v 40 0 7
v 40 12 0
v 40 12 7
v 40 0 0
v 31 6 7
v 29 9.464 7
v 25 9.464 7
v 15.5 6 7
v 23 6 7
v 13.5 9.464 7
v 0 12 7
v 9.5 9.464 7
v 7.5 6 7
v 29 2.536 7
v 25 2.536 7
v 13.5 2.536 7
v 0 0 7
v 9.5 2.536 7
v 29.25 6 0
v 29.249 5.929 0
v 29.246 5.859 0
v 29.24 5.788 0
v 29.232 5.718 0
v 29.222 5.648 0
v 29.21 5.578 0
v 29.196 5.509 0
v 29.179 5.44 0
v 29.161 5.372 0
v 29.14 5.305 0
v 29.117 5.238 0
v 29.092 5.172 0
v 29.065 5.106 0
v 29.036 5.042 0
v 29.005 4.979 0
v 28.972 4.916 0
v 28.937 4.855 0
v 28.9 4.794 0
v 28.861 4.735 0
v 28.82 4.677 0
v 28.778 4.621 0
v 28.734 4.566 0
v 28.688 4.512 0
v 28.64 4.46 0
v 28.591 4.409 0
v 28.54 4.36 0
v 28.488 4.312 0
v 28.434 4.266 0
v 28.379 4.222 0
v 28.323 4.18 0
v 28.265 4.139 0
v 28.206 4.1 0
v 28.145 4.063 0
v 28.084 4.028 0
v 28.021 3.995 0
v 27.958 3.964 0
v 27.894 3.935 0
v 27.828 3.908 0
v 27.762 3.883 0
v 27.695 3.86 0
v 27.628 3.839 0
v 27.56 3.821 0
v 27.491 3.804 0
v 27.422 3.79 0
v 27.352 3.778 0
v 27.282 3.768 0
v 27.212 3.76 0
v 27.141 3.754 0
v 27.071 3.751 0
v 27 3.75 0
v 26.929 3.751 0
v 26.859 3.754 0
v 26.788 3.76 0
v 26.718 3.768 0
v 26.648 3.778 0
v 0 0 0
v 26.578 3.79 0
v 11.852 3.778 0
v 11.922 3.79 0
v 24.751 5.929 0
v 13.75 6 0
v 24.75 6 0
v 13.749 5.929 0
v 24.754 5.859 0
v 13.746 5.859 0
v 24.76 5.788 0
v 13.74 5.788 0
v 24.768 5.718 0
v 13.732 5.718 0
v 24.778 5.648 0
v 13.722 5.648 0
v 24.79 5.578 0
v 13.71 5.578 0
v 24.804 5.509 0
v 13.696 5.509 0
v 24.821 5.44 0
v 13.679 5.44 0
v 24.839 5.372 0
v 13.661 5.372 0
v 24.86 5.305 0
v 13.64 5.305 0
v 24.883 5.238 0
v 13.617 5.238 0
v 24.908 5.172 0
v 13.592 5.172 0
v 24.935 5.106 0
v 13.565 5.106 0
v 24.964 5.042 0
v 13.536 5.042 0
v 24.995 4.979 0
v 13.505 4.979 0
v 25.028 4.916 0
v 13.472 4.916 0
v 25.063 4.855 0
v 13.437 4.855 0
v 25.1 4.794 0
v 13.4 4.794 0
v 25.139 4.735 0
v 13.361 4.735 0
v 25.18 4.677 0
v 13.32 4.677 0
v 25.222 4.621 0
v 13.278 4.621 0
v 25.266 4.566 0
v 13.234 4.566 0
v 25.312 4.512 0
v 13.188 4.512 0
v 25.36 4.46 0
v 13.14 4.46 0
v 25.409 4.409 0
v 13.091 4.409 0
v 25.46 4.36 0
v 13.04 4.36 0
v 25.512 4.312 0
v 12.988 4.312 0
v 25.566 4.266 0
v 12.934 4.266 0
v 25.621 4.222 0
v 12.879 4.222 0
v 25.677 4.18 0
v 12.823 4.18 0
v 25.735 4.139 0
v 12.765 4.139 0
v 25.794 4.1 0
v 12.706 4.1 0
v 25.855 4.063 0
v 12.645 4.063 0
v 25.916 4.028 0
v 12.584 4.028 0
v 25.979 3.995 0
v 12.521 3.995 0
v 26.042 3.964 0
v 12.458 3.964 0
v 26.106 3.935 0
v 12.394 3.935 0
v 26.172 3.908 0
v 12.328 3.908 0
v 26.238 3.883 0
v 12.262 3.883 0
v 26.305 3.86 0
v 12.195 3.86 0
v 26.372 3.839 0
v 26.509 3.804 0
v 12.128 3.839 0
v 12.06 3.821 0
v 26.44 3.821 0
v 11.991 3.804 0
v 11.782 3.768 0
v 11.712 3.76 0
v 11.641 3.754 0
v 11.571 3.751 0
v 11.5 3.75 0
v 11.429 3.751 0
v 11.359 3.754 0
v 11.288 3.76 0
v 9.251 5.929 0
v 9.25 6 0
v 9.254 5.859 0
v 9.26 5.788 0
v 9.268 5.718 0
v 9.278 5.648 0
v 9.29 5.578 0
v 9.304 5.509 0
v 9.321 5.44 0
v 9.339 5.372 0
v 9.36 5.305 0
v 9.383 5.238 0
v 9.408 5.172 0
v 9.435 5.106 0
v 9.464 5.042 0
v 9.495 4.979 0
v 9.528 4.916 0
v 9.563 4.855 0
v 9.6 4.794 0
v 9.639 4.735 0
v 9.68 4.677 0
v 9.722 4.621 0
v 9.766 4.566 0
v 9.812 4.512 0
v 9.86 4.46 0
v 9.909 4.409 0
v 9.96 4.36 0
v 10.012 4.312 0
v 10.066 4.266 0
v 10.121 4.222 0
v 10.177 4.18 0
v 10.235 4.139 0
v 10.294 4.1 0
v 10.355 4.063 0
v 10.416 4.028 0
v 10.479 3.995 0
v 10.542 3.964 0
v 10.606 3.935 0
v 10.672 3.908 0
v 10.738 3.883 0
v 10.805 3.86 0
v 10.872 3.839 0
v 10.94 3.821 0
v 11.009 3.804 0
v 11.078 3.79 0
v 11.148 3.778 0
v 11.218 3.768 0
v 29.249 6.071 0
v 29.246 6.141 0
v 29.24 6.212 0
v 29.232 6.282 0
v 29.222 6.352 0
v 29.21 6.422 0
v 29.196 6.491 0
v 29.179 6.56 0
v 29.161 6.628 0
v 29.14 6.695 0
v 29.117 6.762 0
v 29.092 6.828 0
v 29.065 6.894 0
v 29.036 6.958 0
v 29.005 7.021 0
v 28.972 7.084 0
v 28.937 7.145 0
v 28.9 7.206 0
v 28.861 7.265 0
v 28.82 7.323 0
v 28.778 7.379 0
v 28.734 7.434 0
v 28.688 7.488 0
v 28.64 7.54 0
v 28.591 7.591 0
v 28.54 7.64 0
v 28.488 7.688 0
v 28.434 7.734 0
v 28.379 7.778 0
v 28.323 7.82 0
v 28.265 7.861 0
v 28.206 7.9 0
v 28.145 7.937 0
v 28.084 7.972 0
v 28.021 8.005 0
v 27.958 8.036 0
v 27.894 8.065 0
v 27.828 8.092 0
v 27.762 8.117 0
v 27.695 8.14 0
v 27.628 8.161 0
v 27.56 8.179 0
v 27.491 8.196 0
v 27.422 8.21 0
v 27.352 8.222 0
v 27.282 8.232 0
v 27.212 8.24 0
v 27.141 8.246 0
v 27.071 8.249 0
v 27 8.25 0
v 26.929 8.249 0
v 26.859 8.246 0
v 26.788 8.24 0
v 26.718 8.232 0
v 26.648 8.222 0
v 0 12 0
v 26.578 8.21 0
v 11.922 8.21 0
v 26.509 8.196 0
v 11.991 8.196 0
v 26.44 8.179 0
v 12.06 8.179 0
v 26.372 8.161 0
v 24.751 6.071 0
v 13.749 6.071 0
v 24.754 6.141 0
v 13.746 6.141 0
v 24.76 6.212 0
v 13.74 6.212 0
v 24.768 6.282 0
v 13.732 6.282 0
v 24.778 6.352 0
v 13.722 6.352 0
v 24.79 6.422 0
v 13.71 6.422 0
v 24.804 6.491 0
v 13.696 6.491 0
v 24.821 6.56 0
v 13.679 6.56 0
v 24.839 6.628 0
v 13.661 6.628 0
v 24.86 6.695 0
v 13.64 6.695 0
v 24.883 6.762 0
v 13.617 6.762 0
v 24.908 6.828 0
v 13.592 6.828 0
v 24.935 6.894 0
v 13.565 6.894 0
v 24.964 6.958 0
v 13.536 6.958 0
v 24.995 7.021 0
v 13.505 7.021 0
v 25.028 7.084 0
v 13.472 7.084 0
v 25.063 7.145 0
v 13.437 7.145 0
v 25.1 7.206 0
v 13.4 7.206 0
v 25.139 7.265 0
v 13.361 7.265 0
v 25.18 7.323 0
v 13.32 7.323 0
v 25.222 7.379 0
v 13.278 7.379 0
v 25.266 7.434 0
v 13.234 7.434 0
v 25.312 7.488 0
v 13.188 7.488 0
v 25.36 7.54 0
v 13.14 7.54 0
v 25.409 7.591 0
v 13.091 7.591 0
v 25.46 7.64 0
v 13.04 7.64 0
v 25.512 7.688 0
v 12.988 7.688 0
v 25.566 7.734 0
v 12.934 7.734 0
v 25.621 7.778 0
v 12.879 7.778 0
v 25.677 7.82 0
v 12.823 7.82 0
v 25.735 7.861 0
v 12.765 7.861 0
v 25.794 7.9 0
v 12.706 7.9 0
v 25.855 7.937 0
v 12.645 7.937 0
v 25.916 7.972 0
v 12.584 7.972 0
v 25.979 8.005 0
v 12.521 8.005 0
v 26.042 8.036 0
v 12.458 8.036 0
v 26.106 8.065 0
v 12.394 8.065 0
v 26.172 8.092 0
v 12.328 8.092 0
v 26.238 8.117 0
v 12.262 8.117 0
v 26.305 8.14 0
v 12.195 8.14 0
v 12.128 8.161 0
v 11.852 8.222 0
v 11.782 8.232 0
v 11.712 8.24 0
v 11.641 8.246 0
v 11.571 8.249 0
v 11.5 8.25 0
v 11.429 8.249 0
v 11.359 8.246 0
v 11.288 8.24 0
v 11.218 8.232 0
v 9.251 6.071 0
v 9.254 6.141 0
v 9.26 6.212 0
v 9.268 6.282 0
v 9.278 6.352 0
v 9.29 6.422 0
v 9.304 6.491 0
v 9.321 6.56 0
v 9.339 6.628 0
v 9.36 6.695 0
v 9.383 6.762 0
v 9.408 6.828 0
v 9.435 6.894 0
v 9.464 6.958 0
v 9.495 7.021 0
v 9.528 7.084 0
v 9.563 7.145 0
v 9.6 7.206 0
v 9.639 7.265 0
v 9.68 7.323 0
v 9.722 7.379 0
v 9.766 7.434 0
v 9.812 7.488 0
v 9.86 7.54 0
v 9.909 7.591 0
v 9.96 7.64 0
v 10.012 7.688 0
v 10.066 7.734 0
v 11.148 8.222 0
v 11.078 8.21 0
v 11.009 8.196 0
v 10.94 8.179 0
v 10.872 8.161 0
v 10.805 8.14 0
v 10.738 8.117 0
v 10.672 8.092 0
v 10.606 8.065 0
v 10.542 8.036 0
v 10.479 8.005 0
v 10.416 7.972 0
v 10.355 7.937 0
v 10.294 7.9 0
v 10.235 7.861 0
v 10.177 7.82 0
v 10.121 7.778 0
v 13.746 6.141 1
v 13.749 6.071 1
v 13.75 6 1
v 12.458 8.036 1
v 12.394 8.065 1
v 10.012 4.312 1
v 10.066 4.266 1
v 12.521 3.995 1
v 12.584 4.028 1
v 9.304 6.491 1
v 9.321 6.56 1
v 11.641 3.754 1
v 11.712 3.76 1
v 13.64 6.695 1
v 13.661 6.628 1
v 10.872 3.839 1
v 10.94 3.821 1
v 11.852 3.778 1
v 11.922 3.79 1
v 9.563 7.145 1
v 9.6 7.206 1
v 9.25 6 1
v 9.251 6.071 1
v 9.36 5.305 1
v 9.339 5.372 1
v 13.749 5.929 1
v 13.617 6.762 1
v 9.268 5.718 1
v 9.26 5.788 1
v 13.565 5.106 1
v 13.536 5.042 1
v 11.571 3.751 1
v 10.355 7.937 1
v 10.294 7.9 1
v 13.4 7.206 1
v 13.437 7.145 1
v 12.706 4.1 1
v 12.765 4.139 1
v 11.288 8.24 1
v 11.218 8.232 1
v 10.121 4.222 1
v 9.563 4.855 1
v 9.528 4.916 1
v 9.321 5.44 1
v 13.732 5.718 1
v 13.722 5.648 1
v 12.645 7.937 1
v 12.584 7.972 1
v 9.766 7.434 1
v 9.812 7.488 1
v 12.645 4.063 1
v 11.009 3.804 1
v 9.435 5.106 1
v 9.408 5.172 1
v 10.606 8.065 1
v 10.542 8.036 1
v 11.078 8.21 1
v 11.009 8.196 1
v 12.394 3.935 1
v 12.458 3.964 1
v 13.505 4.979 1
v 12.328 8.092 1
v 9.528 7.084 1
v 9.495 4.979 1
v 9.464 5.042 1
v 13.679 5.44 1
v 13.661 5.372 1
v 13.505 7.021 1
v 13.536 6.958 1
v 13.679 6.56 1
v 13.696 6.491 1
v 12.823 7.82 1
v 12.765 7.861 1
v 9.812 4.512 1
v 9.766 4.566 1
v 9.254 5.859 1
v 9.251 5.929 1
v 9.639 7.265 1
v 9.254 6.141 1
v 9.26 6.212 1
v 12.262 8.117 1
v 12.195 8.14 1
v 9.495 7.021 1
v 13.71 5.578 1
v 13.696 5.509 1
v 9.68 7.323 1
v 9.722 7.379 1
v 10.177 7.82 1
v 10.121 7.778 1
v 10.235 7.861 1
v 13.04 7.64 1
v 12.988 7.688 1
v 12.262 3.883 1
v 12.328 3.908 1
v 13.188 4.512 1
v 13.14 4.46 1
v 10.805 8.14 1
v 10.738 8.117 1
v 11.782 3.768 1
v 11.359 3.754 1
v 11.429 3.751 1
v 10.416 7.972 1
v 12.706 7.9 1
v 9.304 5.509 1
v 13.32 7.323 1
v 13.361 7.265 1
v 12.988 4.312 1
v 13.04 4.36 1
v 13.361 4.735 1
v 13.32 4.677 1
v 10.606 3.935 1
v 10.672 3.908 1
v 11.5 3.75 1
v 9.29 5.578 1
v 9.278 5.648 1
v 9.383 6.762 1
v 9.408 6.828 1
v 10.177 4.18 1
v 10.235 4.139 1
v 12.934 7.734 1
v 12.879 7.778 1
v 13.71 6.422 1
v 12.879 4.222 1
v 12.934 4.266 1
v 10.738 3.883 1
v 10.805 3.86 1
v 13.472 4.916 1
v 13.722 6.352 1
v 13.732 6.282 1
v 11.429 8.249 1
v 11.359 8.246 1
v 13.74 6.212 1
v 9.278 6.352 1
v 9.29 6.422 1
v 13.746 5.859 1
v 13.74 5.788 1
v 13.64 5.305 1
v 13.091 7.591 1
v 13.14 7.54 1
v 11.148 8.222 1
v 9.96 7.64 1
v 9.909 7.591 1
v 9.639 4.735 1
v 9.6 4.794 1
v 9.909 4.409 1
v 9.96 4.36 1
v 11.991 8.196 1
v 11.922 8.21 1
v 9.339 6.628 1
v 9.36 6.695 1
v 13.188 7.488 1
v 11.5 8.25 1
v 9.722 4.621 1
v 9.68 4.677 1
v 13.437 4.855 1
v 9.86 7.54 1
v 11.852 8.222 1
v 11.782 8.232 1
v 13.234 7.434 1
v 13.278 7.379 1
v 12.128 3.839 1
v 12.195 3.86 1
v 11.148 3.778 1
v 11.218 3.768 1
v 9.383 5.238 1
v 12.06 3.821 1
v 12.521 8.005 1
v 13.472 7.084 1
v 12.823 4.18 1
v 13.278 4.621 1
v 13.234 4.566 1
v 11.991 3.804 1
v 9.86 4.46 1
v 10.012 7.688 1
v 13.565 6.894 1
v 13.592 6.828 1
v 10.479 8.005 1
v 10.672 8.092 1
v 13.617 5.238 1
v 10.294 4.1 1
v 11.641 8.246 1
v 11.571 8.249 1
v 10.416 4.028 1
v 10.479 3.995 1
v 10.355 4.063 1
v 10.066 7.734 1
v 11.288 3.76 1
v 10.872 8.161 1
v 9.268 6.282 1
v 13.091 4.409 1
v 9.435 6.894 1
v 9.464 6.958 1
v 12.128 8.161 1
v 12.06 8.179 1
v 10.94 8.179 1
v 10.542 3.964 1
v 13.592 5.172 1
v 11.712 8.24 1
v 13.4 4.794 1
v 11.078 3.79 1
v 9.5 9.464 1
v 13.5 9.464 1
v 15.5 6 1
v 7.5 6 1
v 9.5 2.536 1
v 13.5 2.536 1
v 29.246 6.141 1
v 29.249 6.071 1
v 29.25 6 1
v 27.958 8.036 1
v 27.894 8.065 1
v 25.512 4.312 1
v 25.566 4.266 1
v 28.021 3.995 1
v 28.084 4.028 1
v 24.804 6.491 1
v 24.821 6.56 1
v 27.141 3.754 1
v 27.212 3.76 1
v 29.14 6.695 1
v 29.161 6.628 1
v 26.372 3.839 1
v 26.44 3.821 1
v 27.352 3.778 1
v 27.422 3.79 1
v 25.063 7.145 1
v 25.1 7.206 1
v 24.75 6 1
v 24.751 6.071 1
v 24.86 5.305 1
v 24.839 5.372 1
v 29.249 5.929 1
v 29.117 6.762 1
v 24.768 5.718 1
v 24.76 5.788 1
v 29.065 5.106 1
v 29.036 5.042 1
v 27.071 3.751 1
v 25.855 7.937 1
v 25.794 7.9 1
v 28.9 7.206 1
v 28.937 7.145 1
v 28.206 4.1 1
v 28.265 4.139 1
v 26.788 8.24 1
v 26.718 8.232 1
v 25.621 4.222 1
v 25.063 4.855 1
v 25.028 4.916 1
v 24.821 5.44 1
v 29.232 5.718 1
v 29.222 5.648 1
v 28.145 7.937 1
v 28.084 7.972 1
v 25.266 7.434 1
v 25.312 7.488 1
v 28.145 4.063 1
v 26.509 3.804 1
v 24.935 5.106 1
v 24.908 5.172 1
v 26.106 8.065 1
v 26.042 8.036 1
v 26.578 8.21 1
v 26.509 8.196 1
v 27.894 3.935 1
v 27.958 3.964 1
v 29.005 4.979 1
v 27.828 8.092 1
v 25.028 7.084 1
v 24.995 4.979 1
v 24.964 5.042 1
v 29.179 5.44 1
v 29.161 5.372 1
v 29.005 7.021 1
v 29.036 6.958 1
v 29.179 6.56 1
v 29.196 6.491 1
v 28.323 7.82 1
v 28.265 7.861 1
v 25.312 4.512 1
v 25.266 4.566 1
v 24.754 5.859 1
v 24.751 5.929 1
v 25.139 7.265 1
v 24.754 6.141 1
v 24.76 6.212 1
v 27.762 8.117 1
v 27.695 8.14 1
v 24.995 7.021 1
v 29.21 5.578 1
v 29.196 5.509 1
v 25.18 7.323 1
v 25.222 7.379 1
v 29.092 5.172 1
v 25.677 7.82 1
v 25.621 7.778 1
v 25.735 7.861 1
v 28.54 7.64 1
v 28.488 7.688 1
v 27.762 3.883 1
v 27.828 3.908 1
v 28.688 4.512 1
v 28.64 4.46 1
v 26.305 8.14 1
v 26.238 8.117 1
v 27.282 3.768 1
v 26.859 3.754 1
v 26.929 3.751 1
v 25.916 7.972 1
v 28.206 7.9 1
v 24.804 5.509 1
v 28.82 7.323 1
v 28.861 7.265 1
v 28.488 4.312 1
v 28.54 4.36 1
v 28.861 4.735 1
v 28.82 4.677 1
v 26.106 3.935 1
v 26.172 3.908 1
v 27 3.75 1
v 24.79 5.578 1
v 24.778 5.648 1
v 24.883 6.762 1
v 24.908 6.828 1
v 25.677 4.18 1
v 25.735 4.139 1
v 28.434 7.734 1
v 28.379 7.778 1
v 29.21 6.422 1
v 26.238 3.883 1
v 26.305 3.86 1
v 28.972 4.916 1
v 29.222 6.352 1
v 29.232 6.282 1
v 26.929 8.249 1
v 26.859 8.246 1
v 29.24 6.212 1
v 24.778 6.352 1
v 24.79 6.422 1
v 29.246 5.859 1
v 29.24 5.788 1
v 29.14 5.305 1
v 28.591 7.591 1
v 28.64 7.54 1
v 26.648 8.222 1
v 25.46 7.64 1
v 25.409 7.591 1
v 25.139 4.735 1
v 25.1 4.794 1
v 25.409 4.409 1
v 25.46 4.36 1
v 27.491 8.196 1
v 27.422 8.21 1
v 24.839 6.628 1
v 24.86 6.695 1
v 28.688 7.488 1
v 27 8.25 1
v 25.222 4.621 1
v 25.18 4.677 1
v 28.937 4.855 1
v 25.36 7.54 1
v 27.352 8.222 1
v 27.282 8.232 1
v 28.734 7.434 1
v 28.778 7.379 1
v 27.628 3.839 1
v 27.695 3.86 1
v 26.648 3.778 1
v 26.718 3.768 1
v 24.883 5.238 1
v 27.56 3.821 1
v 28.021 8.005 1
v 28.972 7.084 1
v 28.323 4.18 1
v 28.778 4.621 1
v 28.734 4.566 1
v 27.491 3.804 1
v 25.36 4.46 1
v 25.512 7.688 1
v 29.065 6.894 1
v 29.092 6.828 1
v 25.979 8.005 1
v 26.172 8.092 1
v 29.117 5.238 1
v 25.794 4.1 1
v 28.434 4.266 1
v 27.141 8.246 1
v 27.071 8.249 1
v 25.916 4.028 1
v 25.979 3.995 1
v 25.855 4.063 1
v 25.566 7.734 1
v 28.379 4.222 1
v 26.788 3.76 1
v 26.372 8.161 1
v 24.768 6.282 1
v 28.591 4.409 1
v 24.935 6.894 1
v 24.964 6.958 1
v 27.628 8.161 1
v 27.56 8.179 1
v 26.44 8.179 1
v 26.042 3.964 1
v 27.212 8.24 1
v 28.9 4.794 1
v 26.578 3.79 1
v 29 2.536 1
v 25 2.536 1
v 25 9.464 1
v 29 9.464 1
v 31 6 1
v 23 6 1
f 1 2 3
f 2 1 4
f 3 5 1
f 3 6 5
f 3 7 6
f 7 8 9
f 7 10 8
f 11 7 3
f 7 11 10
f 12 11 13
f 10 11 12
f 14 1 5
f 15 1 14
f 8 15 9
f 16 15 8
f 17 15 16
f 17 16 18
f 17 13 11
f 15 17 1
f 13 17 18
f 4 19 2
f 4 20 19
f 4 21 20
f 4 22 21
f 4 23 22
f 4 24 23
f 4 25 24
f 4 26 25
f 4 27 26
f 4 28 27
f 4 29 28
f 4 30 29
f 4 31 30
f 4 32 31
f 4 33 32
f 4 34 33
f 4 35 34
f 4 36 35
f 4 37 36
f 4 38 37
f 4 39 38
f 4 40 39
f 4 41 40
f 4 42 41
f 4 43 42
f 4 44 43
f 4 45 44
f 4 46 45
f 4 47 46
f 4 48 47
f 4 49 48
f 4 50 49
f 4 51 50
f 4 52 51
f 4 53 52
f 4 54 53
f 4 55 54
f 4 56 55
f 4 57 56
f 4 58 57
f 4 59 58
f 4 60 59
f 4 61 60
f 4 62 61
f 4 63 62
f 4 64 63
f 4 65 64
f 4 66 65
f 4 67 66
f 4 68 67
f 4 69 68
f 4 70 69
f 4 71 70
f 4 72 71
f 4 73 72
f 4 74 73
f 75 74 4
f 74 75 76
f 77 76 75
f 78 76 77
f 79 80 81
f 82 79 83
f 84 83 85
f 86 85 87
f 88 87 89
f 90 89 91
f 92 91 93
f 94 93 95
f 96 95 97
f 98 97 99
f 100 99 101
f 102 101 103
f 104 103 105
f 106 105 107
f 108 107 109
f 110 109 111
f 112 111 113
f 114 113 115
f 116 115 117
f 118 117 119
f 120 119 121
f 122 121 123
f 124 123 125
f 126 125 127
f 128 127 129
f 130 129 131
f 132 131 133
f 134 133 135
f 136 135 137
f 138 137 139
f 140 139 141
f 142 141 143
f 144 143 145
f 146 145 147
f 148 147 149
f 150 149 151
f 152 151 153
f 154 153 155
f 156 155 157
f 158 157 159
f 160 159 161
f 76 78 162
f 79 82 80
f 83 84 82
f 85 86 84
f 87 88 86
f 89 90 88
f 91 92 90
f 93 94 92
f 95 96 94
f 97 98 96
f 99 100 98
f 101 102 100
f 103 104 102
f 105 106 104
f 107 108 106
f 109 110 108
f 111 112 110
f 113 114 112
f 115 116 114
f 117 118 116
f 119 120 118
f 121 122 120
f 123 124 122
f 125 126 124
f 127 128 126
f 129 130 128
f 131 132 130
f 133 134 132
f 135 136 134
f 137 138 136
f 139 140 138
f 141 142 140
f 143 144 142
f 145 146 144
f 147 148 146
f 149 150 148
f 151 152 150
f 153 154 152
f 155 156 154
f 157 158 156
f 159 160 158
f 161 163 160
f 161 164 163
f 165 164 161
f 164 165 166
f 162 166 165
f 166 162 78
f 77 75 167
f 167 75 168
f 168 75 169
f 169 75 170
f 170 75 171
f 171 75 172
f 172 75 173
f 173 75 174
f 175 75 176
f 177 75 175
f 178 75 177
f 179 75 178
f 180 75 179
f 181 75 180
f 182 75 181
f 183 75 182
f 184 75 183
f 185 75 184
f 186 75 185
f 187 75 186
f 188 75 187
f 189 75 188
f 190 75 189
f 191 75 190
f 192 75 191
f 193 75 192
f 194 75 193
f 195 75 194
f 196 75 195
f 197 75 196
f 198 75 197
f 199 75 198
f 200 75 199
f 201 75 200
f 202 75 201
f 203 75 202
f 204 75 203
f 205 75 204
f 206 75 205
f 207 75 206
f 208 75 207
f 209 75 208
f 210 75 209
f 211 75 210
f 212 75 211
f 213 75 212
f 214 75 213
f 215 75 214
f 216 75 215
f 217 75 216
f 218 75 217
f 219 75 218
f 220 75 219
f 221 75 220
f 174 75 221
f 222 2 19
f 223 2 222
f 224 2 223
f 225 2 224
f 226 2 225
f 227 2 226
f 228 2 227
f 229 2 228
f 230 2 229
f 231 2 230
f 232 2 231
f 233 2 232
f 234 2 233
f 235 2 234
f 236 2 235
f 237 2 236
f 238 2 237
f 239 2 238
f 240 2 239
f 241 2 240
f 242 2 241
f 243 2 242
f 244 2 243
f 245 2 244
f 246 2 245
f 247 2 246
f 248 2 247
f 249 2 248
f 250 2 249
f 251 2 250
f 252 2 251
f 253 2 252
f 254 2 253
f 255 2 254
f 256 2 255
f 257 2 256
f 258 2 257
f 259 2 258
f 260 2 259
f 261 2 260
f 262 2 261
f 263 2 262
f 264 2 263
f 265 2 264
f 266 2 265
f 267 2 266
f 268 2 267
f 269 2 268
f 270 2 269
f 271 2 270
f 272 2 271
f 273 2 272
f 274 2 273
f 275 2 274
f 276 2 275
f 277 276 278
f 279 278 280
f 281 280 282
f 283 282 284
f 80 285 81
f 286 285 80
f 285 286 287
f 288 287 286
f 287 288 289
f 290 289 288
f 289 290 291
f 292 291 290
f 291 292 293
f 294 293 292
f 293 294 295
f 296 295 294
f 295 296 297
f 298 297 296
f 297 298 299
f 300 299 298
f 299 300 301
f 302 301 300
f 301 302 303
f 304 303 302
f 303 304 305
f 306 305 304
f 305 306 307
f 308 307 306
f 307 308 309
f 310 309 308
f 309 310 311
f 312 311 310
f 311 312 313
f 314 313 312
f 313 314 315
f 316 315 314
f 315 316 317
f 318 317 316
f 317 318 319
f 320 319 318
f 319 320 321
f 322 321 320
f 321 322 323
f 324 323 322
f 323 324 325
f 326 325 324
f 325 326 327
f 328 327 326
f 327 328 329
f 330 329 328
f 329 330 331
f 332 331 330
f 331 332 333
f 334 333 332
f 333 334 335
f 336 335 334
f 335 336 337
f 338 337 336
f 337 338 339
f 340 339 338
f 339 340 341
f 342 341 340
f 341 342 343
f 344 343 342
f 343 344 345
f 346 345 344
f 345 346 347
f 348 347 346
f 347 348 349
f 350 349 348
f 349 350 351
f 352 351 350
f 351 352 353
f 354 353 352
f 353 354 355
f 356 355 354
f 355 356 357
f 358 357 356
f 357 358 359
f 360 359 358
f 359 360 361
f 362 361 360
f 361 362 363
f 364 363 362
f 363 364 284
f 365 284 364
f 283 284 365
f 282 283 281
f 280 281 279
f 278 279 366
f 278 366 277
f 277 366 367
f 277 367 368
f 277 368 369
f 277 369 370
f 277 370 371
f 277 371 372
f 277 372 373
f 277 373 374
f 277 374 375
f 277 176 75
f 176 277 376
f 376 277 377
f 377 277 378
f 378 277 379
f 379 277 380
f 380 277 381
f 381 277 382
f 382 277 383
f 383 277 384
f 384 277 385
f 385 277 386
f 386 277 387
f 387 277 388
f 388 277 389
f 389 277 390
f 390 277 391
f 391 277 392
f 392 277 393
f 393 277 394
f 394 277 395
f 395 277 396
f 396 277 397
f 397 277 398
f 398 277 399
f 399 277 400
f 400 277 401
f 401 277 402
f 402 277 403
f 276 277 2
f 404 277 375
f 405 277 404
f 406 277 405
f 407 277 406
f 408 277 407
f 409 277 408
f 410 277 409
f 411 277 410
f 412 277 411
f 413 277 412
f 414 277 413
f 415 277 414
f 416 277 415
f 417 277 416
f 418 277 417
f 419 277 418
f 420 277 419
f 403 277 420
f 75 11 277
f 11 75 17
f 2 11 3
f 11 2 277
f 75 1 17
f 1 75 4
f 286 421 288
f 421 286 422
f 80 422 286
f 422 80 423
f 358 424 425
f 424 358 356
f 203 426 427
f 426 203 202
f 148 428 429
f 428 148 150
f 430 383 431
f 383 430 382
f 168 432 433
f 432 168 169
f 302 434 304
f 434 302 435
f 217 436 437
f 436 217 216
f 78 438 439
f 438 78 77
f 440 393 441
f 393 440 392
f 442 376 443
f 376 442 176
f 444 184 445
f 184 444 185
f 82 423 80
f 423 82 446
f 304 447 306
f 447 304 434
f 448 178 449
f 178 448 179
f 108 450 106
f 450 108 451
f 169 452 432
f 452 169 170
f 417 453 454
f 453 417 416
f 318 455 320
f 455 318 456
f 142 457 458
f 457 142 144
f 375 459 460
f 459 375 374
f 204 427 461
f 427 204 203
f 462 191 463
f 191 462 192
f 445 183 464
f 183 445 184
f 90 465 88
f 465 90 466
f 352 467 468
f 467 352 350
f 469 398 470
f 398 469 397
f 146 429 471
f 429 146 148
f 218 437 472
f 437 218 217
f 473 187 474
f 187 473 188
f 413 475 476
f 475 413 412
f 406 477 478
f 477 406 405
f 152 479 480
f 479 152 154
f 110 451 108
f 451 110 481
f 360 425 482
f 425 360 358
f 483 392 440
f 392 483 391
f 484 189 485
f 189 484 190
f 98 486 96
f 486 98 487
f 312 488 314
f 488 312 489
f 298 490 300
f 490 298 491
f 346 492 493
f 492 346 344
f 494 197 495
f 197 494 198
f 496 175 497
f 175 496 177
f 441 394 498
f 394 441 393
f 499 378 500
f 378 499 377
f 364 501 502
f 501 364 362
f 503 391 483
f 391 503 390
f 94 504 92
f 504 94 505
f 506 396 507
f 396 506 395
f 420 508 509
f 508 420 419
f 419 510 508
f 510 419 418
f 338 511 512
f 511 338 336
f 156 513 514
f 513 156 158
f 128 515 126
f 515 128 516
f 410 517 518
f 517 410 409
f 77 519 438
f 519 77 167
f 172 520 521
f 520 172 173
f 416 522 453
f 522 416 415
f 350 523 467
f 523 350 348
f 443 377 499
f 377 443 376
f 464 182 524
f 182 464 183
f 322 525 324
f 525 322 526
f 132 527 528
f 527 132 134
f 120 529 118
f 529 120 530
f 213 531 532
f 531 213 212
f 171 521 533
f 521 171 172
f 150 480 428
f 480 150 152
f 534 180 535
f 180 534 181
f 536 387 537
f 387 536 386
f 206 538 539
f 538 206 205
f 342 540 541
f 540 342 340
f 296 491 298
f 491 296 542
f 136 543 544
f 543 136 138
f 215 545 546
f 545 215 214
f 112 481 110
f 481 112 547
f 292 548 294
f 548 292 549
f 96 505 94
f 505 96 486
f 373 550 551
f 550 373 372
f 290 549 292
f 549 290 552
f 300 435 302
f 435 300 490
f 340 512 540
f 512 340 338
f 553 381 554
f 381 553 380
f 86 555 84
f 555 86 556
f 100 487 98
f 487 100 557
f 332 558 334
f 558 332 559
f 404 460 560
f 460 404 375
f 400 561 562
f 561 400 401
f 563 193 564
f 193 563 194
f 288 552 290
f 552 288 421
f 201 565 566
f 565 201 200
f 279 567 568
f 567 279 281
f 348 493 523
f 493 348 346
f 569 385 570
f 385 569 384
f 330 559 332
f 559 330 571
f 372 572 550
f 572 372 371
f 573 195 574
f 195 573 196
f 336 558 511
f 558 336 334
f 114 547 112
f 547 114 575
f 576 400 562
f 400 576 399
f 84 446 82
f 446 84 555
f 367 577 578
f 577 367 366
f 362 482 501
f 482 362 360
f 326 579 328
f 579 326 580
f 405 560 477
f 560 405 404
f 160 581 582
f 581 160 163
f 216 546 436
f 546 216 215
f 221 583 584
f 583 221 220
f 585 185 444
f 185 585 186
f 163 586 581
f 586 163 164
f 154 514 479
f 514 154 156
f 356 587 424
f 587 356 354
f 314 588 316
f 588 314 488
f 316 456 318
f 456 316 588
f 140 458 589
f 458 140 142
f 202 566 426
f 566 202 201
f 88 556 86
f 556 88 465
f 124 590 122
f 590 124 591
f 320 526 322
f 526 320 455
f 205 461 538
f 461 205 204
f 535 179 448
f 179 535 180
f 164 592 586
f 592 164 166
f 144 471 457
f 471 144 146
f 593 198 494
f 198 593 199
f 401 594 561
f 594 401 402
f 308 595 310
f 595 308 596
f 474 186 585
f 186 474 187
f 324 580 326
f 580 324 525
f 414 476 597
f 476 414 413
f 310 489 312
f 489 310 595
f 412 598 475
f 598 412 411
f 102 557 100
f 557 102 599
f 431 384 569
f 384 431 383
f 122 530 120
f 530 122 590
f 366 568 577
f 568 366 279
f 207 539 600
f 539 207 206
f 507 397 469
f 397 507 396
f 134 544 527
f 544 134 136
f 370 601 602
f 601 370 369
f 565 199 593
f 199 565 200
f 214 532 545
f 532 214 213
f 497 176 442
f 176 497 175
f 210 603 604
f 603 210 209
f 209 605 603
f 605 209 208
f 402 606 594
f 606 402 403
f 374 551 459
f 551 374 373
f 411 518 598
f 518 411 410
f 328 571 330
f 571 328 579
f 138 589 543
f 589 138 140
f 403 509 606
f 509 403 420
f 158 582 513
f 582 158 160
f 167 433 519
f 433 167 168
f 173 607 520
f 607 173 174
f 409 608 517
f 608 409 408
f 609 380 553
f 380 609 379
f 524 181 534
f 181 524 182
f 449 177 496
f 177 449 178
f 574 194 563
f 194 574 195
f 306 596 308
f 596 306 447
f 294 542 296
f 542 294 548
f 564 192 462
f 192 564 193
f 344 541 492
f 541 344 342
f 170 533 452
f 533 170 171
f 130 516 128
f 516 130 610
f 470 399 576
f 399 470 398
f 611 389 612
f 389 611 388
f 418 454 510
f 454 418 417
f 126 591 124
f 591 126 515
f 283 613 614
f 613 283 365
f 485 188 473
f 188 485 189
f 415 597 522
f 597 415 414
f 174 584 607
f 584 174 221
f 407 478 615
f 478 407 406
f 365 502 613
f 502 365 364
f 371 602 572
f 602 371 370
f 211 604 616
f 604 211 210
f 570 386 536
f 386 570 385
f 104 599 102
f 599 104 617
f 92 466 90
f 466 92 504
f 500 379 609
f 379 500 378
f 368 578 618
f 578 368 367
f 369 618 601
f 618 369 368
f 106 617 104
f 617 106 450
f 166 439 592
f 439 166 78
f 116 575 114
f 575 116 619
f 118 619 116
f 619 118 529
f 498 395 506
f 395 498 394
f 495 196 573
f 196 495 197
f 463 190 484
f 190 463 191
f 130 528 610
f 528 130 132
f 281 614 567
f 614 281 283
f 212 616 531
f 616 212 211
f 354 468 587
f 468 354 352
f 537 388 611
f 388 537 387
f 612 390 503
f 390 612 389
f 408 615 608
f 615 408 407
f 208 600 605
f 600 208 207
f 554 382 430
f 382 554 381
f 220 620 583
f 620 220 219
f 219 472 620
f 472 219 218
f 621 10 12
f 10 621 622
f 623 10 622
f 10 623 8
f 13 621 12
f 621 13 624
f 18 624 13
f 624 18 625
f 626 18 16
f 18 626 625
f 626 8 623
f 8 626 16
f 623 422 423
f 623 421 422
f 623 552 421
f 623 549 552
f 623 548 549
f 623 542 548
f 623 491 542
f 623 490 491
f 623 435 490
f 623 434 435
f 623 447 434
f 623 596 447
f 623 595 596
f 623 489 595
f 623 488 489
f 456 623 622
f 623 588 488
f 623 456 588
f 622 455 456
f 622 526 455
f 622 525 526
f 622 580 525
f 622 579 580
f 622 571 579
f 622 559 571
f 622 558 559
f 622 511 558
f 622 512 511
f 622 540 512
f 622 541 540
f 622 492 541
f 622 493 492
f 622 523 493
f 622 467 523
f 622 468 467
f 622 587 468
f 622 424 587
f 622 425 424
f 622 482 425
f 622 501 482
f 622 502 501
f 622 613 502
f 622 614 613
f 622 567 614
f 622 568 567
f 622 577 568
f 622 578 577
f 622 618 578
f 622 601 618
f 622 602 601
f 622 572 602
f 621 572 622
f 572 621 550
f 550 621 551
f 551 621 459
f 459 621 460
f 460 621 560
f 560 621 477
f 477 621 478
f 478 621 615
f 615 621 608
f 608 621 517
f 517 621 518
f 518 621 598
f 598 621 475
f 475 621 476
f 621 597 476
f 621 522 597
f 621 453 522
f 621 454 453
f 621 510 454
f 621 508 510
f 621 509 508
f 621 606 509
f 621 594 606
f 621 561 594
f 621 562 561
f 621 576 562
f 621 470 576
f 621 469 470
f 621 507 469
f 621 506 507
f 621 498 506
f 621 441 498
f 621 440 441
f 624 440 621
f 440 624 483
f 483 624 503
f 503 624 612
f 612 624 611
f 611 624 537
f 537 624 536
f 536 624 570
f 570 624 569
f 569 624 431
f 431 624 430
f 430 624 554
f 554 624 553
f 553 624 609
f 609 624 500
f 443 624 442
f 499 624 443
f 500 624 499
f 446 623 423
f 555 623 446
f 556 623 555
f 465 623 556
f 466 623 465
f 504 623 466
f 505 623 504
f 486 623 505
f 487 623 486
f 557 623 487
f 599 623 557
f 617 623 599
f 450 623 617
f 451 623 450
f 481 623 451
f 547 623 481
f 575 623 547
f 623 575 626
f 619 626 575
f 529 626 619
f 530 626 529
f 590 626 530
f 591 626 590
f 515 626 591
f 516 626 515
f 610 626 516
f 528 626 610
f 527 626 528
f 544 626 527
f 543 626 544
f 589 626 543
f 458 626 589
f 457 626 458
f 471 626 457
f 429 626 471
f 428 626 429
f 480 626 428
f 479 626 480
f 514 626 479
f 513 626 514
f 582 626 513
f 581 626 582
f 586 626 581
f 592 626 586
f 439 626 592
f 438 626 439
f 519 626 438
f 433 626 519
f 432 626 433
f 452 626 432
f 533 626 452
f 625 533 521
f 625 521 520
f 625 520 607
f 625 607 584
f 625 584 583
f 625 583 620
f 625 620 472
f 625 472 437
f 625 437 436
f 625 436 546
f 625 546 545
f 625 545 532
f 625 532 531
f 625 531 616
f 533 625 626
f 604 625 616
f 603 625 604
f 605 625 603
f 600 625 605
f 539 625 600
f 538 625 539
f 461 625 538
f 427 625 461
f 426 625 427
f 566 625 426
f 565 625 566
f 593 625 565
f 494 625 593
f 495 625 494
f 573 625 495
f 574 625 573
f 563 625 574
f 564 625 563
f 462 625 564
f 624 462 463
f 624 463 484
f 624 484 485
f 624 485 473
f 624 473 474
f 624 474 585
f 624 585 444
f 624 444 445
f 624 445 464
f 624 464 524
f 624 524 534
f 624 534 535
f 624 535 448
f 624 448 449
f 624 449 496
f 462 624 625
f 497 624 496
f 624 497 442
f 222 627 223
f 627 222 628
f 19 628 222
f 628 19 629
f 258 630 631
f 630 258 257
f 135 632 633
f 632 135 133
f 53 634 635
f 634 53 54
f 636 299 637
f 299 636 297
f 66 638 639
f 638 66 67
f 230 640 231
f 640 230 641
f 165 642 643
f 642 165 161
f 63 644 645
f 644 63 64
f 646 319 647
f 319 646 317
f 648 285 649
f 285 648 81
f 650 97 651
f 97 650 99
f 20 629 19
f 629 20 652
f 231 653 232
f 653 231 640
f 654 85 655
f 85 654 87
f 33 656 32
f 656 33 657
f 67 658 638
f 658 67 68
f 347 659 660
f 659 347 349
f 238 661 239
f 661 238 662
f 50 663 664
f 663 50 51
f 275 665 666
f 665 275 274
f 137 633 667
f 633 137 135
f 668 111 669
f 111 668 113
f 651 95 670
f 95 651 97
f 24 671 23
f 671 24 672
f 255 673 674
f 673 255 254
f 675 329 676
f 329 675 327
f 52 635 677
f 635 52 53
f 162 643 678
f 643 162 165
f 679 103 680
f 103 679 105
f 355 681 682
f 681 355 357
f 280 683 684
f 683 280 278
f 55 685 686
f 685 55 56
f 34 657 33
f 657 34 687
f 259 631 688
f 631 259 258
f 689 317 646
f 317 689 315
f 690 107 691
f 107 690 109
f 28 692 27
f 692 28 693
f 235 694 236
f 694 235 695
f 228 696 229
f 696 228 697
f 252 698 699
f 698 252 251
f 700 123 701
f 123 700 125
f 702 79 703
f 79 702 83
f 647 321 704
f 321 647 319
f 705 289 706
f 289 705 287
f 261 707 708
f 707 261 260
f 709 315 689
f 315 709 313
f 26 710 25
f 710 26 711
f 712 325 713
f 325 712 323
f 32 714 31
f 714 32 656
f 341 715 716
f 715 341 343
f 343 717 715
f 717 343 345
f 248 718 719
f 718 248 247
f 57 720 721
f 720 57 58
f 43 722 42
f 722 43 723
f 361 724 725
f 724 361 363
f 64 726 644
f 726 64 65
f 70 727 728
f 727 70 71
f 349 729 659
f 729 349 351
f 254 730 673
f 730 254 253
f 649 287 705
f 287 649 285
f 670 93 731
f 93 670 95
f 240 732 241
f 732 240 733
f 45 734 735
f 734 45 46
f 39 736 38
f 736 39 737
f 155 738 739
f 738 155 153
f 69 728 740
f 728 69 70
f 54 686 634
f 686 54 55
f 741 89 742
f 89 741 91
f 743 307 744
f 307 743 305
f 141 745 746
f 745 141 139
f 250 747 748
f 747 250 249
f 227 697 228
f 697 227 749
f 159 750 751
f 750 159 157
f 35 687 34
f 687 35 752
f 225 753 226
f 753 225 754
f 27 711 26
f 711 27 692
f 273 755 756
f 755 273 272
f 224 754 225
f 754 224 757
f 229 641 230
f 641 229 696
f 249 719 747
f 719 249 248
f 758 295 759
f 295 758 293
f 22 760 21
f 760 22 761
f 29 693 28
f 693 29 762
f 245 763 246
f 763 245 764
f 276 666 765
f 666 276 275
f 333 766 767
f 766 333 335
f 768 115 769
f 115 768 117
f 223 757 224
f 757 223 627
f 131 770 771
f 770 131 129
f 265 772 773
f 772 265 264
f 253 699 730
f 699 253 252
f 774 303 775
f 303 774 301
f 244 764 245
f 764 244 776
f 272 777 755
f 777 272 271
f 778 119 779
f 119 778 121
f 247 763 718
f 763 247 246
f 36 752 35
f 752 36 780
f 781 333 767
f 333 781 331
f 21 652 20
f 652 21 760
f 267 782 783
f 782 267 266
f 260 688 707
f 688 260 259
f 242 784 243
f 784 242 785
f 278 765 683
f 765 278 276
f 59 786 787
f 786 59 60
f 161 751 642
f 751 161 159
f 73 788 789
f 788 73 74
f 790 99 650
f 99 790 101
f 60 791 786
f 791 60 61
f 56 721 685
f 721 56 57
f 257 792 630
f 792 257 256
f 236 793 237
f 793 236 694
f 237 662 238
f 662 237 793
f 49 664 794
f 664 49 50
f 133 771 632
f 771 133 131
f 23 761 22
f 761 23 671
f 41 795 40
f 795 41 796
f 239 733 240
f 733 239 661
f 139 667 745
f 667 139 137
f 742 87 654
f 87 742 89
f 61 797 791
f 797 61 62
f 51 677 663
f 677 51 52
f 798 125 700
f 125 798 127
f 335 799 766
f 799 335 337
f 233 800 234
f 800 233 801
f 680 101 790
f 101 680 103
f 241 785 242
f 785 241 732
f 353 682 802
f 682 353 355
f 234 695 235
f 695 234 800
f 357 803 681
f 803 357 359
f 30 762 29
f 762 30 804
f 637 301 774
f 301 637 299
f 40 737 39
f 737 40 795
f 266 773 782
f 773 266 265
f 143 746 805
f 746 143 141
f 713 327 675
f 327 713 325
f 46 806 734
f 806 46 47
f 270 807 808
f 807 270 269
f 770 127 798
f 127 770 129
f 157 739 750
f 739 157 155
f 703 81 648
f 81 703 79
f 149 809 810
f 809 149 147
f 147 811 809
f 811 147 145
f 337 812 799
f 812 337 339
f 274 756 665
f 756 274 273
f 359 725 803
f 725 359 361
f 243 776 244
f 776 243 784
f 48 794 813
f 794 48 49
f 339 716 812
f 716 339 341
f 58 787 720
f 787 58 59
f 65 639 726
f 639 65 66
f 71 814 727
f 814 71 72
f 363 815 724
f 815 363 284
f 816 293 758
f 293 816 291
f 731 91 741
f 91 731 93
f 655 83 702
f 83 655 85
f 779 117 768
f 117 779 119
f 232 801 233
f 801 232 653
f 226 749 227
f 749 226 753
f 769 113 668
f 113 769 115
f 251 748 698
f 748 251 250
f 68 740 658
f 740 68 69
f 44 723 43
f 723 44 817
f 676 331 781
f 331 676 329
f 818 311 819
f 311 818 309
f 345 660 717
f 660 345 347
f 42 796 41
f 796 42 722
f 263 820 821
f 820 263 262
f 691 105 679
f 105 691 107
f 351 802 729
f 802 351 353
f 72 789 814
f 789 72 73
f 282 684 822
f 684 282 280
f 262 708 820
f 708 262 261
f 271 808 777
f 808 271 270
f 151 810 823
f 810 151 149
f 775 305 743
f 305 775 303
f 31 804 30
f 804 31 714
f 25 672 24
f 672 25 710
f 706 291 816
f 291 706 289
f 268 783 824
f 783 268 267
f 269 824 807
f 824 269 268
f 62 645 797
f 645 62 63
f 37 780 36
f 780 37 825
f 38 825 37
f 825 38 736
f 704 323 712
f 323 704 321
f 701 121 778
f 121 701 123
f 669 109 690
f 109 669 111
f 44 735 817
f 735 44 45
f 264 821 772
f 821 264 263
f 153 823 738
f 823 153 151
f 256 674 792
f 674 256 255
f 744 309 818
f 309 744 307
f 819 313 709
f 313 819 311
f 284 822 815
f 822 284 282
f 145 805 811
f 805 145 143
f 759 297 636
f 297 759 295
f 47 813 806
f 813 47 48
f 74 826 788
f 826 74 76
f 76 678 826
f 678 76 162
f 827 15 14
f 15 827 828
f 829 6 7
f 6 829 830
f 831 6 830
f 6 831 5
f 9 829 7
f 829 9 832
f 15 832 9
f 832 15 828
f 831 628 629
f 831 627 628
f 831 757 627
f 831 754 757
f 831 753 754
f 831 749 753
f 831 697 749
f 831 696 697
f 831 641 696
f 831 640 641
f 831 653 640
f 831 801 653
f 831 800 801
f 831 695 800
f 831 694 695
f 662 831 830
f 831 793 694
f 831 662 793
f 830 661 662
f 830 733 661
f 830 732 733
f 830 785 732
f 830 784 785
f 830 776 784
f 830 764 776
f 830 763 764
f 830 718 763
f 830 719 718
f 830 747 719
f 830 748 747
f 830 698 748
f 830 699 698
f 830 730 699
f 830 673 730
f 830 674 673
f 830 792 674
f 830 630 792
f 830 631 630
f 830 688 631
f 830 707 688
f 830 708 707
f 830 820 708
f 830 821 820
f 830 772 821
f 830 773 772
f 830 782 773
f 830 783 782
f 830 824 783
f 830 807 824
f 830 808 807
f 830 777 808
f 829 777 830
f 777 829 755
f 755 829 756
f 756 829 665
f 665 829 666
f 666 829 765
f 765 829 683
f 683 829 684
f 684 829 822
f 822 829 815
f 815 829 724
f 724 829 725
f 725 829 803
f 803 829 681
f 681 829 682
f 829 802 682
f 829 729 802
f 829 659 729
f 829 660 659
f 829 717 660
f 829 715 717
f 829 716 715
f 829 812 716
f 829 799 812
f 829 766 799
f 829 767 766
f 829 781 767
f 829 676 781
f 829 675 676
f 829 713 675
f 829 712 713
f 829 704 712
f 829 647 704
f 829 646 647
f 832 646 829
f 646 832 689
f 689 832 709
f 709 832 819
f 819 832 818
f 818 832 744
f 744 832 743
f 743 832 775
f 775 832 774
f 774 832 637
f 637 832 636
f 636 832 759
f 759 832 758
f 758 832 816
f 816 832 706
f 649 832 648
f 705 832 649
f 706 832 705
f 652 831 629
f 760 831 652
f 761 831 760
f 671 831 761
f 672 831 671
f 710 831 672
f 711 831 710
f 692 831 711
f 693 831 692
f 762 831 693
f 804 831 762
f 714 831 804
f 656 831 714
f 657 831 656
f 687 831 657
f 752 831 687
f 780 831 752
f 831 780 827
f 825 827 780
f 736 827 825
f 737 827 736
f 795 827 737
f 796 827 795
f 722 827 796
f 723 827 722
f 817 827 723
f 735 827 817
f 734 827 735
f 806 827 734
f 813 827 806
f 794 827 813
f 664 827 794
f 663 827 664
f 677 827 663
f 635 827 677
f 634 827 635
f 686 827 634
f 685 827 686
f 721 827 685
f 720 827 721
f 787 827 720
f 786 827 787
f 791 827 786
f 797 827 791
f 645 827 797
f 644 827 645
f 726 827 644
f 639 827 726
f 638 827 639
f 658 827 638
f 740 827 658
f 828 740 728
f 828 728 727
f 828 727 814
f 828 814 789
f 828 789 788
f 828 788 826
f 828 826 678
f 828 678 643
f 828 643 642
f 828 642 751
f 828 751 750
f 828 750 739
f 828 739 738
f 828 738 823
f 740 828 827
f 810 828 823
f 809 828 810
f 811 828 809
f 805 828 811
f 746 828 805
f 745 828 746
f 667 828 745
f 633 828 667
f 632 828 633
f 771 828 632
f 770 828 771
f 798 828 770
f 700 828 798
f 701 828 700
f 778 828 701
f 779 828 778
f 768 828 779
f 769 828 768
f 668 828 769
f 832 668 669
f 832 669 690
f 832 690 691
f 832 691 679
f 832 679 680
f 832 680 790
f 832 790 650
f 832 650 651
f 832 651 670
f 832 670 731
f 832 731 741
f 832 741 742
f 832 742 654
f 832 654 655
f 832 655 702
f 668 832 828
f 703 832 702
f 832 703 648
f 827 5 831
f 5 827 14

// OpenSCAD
$fn=200;

// spacerBlock

difference()
{
    cube([40,12,7]);
    translate([11.5,6,-1])
    {
        cylinder(d=4.5,h=9);      
    }
    translate([11.5,6,1])
    {
        cylinder(d=8,h=9,$fn=6);      
    }
    translate([27,6,-1])
    {
        cylinder(d=4.5,h=9);
    }
    translate([27,6,1])
    {
        cylinder(d=8,h=9,$fn=6);
    }
}
